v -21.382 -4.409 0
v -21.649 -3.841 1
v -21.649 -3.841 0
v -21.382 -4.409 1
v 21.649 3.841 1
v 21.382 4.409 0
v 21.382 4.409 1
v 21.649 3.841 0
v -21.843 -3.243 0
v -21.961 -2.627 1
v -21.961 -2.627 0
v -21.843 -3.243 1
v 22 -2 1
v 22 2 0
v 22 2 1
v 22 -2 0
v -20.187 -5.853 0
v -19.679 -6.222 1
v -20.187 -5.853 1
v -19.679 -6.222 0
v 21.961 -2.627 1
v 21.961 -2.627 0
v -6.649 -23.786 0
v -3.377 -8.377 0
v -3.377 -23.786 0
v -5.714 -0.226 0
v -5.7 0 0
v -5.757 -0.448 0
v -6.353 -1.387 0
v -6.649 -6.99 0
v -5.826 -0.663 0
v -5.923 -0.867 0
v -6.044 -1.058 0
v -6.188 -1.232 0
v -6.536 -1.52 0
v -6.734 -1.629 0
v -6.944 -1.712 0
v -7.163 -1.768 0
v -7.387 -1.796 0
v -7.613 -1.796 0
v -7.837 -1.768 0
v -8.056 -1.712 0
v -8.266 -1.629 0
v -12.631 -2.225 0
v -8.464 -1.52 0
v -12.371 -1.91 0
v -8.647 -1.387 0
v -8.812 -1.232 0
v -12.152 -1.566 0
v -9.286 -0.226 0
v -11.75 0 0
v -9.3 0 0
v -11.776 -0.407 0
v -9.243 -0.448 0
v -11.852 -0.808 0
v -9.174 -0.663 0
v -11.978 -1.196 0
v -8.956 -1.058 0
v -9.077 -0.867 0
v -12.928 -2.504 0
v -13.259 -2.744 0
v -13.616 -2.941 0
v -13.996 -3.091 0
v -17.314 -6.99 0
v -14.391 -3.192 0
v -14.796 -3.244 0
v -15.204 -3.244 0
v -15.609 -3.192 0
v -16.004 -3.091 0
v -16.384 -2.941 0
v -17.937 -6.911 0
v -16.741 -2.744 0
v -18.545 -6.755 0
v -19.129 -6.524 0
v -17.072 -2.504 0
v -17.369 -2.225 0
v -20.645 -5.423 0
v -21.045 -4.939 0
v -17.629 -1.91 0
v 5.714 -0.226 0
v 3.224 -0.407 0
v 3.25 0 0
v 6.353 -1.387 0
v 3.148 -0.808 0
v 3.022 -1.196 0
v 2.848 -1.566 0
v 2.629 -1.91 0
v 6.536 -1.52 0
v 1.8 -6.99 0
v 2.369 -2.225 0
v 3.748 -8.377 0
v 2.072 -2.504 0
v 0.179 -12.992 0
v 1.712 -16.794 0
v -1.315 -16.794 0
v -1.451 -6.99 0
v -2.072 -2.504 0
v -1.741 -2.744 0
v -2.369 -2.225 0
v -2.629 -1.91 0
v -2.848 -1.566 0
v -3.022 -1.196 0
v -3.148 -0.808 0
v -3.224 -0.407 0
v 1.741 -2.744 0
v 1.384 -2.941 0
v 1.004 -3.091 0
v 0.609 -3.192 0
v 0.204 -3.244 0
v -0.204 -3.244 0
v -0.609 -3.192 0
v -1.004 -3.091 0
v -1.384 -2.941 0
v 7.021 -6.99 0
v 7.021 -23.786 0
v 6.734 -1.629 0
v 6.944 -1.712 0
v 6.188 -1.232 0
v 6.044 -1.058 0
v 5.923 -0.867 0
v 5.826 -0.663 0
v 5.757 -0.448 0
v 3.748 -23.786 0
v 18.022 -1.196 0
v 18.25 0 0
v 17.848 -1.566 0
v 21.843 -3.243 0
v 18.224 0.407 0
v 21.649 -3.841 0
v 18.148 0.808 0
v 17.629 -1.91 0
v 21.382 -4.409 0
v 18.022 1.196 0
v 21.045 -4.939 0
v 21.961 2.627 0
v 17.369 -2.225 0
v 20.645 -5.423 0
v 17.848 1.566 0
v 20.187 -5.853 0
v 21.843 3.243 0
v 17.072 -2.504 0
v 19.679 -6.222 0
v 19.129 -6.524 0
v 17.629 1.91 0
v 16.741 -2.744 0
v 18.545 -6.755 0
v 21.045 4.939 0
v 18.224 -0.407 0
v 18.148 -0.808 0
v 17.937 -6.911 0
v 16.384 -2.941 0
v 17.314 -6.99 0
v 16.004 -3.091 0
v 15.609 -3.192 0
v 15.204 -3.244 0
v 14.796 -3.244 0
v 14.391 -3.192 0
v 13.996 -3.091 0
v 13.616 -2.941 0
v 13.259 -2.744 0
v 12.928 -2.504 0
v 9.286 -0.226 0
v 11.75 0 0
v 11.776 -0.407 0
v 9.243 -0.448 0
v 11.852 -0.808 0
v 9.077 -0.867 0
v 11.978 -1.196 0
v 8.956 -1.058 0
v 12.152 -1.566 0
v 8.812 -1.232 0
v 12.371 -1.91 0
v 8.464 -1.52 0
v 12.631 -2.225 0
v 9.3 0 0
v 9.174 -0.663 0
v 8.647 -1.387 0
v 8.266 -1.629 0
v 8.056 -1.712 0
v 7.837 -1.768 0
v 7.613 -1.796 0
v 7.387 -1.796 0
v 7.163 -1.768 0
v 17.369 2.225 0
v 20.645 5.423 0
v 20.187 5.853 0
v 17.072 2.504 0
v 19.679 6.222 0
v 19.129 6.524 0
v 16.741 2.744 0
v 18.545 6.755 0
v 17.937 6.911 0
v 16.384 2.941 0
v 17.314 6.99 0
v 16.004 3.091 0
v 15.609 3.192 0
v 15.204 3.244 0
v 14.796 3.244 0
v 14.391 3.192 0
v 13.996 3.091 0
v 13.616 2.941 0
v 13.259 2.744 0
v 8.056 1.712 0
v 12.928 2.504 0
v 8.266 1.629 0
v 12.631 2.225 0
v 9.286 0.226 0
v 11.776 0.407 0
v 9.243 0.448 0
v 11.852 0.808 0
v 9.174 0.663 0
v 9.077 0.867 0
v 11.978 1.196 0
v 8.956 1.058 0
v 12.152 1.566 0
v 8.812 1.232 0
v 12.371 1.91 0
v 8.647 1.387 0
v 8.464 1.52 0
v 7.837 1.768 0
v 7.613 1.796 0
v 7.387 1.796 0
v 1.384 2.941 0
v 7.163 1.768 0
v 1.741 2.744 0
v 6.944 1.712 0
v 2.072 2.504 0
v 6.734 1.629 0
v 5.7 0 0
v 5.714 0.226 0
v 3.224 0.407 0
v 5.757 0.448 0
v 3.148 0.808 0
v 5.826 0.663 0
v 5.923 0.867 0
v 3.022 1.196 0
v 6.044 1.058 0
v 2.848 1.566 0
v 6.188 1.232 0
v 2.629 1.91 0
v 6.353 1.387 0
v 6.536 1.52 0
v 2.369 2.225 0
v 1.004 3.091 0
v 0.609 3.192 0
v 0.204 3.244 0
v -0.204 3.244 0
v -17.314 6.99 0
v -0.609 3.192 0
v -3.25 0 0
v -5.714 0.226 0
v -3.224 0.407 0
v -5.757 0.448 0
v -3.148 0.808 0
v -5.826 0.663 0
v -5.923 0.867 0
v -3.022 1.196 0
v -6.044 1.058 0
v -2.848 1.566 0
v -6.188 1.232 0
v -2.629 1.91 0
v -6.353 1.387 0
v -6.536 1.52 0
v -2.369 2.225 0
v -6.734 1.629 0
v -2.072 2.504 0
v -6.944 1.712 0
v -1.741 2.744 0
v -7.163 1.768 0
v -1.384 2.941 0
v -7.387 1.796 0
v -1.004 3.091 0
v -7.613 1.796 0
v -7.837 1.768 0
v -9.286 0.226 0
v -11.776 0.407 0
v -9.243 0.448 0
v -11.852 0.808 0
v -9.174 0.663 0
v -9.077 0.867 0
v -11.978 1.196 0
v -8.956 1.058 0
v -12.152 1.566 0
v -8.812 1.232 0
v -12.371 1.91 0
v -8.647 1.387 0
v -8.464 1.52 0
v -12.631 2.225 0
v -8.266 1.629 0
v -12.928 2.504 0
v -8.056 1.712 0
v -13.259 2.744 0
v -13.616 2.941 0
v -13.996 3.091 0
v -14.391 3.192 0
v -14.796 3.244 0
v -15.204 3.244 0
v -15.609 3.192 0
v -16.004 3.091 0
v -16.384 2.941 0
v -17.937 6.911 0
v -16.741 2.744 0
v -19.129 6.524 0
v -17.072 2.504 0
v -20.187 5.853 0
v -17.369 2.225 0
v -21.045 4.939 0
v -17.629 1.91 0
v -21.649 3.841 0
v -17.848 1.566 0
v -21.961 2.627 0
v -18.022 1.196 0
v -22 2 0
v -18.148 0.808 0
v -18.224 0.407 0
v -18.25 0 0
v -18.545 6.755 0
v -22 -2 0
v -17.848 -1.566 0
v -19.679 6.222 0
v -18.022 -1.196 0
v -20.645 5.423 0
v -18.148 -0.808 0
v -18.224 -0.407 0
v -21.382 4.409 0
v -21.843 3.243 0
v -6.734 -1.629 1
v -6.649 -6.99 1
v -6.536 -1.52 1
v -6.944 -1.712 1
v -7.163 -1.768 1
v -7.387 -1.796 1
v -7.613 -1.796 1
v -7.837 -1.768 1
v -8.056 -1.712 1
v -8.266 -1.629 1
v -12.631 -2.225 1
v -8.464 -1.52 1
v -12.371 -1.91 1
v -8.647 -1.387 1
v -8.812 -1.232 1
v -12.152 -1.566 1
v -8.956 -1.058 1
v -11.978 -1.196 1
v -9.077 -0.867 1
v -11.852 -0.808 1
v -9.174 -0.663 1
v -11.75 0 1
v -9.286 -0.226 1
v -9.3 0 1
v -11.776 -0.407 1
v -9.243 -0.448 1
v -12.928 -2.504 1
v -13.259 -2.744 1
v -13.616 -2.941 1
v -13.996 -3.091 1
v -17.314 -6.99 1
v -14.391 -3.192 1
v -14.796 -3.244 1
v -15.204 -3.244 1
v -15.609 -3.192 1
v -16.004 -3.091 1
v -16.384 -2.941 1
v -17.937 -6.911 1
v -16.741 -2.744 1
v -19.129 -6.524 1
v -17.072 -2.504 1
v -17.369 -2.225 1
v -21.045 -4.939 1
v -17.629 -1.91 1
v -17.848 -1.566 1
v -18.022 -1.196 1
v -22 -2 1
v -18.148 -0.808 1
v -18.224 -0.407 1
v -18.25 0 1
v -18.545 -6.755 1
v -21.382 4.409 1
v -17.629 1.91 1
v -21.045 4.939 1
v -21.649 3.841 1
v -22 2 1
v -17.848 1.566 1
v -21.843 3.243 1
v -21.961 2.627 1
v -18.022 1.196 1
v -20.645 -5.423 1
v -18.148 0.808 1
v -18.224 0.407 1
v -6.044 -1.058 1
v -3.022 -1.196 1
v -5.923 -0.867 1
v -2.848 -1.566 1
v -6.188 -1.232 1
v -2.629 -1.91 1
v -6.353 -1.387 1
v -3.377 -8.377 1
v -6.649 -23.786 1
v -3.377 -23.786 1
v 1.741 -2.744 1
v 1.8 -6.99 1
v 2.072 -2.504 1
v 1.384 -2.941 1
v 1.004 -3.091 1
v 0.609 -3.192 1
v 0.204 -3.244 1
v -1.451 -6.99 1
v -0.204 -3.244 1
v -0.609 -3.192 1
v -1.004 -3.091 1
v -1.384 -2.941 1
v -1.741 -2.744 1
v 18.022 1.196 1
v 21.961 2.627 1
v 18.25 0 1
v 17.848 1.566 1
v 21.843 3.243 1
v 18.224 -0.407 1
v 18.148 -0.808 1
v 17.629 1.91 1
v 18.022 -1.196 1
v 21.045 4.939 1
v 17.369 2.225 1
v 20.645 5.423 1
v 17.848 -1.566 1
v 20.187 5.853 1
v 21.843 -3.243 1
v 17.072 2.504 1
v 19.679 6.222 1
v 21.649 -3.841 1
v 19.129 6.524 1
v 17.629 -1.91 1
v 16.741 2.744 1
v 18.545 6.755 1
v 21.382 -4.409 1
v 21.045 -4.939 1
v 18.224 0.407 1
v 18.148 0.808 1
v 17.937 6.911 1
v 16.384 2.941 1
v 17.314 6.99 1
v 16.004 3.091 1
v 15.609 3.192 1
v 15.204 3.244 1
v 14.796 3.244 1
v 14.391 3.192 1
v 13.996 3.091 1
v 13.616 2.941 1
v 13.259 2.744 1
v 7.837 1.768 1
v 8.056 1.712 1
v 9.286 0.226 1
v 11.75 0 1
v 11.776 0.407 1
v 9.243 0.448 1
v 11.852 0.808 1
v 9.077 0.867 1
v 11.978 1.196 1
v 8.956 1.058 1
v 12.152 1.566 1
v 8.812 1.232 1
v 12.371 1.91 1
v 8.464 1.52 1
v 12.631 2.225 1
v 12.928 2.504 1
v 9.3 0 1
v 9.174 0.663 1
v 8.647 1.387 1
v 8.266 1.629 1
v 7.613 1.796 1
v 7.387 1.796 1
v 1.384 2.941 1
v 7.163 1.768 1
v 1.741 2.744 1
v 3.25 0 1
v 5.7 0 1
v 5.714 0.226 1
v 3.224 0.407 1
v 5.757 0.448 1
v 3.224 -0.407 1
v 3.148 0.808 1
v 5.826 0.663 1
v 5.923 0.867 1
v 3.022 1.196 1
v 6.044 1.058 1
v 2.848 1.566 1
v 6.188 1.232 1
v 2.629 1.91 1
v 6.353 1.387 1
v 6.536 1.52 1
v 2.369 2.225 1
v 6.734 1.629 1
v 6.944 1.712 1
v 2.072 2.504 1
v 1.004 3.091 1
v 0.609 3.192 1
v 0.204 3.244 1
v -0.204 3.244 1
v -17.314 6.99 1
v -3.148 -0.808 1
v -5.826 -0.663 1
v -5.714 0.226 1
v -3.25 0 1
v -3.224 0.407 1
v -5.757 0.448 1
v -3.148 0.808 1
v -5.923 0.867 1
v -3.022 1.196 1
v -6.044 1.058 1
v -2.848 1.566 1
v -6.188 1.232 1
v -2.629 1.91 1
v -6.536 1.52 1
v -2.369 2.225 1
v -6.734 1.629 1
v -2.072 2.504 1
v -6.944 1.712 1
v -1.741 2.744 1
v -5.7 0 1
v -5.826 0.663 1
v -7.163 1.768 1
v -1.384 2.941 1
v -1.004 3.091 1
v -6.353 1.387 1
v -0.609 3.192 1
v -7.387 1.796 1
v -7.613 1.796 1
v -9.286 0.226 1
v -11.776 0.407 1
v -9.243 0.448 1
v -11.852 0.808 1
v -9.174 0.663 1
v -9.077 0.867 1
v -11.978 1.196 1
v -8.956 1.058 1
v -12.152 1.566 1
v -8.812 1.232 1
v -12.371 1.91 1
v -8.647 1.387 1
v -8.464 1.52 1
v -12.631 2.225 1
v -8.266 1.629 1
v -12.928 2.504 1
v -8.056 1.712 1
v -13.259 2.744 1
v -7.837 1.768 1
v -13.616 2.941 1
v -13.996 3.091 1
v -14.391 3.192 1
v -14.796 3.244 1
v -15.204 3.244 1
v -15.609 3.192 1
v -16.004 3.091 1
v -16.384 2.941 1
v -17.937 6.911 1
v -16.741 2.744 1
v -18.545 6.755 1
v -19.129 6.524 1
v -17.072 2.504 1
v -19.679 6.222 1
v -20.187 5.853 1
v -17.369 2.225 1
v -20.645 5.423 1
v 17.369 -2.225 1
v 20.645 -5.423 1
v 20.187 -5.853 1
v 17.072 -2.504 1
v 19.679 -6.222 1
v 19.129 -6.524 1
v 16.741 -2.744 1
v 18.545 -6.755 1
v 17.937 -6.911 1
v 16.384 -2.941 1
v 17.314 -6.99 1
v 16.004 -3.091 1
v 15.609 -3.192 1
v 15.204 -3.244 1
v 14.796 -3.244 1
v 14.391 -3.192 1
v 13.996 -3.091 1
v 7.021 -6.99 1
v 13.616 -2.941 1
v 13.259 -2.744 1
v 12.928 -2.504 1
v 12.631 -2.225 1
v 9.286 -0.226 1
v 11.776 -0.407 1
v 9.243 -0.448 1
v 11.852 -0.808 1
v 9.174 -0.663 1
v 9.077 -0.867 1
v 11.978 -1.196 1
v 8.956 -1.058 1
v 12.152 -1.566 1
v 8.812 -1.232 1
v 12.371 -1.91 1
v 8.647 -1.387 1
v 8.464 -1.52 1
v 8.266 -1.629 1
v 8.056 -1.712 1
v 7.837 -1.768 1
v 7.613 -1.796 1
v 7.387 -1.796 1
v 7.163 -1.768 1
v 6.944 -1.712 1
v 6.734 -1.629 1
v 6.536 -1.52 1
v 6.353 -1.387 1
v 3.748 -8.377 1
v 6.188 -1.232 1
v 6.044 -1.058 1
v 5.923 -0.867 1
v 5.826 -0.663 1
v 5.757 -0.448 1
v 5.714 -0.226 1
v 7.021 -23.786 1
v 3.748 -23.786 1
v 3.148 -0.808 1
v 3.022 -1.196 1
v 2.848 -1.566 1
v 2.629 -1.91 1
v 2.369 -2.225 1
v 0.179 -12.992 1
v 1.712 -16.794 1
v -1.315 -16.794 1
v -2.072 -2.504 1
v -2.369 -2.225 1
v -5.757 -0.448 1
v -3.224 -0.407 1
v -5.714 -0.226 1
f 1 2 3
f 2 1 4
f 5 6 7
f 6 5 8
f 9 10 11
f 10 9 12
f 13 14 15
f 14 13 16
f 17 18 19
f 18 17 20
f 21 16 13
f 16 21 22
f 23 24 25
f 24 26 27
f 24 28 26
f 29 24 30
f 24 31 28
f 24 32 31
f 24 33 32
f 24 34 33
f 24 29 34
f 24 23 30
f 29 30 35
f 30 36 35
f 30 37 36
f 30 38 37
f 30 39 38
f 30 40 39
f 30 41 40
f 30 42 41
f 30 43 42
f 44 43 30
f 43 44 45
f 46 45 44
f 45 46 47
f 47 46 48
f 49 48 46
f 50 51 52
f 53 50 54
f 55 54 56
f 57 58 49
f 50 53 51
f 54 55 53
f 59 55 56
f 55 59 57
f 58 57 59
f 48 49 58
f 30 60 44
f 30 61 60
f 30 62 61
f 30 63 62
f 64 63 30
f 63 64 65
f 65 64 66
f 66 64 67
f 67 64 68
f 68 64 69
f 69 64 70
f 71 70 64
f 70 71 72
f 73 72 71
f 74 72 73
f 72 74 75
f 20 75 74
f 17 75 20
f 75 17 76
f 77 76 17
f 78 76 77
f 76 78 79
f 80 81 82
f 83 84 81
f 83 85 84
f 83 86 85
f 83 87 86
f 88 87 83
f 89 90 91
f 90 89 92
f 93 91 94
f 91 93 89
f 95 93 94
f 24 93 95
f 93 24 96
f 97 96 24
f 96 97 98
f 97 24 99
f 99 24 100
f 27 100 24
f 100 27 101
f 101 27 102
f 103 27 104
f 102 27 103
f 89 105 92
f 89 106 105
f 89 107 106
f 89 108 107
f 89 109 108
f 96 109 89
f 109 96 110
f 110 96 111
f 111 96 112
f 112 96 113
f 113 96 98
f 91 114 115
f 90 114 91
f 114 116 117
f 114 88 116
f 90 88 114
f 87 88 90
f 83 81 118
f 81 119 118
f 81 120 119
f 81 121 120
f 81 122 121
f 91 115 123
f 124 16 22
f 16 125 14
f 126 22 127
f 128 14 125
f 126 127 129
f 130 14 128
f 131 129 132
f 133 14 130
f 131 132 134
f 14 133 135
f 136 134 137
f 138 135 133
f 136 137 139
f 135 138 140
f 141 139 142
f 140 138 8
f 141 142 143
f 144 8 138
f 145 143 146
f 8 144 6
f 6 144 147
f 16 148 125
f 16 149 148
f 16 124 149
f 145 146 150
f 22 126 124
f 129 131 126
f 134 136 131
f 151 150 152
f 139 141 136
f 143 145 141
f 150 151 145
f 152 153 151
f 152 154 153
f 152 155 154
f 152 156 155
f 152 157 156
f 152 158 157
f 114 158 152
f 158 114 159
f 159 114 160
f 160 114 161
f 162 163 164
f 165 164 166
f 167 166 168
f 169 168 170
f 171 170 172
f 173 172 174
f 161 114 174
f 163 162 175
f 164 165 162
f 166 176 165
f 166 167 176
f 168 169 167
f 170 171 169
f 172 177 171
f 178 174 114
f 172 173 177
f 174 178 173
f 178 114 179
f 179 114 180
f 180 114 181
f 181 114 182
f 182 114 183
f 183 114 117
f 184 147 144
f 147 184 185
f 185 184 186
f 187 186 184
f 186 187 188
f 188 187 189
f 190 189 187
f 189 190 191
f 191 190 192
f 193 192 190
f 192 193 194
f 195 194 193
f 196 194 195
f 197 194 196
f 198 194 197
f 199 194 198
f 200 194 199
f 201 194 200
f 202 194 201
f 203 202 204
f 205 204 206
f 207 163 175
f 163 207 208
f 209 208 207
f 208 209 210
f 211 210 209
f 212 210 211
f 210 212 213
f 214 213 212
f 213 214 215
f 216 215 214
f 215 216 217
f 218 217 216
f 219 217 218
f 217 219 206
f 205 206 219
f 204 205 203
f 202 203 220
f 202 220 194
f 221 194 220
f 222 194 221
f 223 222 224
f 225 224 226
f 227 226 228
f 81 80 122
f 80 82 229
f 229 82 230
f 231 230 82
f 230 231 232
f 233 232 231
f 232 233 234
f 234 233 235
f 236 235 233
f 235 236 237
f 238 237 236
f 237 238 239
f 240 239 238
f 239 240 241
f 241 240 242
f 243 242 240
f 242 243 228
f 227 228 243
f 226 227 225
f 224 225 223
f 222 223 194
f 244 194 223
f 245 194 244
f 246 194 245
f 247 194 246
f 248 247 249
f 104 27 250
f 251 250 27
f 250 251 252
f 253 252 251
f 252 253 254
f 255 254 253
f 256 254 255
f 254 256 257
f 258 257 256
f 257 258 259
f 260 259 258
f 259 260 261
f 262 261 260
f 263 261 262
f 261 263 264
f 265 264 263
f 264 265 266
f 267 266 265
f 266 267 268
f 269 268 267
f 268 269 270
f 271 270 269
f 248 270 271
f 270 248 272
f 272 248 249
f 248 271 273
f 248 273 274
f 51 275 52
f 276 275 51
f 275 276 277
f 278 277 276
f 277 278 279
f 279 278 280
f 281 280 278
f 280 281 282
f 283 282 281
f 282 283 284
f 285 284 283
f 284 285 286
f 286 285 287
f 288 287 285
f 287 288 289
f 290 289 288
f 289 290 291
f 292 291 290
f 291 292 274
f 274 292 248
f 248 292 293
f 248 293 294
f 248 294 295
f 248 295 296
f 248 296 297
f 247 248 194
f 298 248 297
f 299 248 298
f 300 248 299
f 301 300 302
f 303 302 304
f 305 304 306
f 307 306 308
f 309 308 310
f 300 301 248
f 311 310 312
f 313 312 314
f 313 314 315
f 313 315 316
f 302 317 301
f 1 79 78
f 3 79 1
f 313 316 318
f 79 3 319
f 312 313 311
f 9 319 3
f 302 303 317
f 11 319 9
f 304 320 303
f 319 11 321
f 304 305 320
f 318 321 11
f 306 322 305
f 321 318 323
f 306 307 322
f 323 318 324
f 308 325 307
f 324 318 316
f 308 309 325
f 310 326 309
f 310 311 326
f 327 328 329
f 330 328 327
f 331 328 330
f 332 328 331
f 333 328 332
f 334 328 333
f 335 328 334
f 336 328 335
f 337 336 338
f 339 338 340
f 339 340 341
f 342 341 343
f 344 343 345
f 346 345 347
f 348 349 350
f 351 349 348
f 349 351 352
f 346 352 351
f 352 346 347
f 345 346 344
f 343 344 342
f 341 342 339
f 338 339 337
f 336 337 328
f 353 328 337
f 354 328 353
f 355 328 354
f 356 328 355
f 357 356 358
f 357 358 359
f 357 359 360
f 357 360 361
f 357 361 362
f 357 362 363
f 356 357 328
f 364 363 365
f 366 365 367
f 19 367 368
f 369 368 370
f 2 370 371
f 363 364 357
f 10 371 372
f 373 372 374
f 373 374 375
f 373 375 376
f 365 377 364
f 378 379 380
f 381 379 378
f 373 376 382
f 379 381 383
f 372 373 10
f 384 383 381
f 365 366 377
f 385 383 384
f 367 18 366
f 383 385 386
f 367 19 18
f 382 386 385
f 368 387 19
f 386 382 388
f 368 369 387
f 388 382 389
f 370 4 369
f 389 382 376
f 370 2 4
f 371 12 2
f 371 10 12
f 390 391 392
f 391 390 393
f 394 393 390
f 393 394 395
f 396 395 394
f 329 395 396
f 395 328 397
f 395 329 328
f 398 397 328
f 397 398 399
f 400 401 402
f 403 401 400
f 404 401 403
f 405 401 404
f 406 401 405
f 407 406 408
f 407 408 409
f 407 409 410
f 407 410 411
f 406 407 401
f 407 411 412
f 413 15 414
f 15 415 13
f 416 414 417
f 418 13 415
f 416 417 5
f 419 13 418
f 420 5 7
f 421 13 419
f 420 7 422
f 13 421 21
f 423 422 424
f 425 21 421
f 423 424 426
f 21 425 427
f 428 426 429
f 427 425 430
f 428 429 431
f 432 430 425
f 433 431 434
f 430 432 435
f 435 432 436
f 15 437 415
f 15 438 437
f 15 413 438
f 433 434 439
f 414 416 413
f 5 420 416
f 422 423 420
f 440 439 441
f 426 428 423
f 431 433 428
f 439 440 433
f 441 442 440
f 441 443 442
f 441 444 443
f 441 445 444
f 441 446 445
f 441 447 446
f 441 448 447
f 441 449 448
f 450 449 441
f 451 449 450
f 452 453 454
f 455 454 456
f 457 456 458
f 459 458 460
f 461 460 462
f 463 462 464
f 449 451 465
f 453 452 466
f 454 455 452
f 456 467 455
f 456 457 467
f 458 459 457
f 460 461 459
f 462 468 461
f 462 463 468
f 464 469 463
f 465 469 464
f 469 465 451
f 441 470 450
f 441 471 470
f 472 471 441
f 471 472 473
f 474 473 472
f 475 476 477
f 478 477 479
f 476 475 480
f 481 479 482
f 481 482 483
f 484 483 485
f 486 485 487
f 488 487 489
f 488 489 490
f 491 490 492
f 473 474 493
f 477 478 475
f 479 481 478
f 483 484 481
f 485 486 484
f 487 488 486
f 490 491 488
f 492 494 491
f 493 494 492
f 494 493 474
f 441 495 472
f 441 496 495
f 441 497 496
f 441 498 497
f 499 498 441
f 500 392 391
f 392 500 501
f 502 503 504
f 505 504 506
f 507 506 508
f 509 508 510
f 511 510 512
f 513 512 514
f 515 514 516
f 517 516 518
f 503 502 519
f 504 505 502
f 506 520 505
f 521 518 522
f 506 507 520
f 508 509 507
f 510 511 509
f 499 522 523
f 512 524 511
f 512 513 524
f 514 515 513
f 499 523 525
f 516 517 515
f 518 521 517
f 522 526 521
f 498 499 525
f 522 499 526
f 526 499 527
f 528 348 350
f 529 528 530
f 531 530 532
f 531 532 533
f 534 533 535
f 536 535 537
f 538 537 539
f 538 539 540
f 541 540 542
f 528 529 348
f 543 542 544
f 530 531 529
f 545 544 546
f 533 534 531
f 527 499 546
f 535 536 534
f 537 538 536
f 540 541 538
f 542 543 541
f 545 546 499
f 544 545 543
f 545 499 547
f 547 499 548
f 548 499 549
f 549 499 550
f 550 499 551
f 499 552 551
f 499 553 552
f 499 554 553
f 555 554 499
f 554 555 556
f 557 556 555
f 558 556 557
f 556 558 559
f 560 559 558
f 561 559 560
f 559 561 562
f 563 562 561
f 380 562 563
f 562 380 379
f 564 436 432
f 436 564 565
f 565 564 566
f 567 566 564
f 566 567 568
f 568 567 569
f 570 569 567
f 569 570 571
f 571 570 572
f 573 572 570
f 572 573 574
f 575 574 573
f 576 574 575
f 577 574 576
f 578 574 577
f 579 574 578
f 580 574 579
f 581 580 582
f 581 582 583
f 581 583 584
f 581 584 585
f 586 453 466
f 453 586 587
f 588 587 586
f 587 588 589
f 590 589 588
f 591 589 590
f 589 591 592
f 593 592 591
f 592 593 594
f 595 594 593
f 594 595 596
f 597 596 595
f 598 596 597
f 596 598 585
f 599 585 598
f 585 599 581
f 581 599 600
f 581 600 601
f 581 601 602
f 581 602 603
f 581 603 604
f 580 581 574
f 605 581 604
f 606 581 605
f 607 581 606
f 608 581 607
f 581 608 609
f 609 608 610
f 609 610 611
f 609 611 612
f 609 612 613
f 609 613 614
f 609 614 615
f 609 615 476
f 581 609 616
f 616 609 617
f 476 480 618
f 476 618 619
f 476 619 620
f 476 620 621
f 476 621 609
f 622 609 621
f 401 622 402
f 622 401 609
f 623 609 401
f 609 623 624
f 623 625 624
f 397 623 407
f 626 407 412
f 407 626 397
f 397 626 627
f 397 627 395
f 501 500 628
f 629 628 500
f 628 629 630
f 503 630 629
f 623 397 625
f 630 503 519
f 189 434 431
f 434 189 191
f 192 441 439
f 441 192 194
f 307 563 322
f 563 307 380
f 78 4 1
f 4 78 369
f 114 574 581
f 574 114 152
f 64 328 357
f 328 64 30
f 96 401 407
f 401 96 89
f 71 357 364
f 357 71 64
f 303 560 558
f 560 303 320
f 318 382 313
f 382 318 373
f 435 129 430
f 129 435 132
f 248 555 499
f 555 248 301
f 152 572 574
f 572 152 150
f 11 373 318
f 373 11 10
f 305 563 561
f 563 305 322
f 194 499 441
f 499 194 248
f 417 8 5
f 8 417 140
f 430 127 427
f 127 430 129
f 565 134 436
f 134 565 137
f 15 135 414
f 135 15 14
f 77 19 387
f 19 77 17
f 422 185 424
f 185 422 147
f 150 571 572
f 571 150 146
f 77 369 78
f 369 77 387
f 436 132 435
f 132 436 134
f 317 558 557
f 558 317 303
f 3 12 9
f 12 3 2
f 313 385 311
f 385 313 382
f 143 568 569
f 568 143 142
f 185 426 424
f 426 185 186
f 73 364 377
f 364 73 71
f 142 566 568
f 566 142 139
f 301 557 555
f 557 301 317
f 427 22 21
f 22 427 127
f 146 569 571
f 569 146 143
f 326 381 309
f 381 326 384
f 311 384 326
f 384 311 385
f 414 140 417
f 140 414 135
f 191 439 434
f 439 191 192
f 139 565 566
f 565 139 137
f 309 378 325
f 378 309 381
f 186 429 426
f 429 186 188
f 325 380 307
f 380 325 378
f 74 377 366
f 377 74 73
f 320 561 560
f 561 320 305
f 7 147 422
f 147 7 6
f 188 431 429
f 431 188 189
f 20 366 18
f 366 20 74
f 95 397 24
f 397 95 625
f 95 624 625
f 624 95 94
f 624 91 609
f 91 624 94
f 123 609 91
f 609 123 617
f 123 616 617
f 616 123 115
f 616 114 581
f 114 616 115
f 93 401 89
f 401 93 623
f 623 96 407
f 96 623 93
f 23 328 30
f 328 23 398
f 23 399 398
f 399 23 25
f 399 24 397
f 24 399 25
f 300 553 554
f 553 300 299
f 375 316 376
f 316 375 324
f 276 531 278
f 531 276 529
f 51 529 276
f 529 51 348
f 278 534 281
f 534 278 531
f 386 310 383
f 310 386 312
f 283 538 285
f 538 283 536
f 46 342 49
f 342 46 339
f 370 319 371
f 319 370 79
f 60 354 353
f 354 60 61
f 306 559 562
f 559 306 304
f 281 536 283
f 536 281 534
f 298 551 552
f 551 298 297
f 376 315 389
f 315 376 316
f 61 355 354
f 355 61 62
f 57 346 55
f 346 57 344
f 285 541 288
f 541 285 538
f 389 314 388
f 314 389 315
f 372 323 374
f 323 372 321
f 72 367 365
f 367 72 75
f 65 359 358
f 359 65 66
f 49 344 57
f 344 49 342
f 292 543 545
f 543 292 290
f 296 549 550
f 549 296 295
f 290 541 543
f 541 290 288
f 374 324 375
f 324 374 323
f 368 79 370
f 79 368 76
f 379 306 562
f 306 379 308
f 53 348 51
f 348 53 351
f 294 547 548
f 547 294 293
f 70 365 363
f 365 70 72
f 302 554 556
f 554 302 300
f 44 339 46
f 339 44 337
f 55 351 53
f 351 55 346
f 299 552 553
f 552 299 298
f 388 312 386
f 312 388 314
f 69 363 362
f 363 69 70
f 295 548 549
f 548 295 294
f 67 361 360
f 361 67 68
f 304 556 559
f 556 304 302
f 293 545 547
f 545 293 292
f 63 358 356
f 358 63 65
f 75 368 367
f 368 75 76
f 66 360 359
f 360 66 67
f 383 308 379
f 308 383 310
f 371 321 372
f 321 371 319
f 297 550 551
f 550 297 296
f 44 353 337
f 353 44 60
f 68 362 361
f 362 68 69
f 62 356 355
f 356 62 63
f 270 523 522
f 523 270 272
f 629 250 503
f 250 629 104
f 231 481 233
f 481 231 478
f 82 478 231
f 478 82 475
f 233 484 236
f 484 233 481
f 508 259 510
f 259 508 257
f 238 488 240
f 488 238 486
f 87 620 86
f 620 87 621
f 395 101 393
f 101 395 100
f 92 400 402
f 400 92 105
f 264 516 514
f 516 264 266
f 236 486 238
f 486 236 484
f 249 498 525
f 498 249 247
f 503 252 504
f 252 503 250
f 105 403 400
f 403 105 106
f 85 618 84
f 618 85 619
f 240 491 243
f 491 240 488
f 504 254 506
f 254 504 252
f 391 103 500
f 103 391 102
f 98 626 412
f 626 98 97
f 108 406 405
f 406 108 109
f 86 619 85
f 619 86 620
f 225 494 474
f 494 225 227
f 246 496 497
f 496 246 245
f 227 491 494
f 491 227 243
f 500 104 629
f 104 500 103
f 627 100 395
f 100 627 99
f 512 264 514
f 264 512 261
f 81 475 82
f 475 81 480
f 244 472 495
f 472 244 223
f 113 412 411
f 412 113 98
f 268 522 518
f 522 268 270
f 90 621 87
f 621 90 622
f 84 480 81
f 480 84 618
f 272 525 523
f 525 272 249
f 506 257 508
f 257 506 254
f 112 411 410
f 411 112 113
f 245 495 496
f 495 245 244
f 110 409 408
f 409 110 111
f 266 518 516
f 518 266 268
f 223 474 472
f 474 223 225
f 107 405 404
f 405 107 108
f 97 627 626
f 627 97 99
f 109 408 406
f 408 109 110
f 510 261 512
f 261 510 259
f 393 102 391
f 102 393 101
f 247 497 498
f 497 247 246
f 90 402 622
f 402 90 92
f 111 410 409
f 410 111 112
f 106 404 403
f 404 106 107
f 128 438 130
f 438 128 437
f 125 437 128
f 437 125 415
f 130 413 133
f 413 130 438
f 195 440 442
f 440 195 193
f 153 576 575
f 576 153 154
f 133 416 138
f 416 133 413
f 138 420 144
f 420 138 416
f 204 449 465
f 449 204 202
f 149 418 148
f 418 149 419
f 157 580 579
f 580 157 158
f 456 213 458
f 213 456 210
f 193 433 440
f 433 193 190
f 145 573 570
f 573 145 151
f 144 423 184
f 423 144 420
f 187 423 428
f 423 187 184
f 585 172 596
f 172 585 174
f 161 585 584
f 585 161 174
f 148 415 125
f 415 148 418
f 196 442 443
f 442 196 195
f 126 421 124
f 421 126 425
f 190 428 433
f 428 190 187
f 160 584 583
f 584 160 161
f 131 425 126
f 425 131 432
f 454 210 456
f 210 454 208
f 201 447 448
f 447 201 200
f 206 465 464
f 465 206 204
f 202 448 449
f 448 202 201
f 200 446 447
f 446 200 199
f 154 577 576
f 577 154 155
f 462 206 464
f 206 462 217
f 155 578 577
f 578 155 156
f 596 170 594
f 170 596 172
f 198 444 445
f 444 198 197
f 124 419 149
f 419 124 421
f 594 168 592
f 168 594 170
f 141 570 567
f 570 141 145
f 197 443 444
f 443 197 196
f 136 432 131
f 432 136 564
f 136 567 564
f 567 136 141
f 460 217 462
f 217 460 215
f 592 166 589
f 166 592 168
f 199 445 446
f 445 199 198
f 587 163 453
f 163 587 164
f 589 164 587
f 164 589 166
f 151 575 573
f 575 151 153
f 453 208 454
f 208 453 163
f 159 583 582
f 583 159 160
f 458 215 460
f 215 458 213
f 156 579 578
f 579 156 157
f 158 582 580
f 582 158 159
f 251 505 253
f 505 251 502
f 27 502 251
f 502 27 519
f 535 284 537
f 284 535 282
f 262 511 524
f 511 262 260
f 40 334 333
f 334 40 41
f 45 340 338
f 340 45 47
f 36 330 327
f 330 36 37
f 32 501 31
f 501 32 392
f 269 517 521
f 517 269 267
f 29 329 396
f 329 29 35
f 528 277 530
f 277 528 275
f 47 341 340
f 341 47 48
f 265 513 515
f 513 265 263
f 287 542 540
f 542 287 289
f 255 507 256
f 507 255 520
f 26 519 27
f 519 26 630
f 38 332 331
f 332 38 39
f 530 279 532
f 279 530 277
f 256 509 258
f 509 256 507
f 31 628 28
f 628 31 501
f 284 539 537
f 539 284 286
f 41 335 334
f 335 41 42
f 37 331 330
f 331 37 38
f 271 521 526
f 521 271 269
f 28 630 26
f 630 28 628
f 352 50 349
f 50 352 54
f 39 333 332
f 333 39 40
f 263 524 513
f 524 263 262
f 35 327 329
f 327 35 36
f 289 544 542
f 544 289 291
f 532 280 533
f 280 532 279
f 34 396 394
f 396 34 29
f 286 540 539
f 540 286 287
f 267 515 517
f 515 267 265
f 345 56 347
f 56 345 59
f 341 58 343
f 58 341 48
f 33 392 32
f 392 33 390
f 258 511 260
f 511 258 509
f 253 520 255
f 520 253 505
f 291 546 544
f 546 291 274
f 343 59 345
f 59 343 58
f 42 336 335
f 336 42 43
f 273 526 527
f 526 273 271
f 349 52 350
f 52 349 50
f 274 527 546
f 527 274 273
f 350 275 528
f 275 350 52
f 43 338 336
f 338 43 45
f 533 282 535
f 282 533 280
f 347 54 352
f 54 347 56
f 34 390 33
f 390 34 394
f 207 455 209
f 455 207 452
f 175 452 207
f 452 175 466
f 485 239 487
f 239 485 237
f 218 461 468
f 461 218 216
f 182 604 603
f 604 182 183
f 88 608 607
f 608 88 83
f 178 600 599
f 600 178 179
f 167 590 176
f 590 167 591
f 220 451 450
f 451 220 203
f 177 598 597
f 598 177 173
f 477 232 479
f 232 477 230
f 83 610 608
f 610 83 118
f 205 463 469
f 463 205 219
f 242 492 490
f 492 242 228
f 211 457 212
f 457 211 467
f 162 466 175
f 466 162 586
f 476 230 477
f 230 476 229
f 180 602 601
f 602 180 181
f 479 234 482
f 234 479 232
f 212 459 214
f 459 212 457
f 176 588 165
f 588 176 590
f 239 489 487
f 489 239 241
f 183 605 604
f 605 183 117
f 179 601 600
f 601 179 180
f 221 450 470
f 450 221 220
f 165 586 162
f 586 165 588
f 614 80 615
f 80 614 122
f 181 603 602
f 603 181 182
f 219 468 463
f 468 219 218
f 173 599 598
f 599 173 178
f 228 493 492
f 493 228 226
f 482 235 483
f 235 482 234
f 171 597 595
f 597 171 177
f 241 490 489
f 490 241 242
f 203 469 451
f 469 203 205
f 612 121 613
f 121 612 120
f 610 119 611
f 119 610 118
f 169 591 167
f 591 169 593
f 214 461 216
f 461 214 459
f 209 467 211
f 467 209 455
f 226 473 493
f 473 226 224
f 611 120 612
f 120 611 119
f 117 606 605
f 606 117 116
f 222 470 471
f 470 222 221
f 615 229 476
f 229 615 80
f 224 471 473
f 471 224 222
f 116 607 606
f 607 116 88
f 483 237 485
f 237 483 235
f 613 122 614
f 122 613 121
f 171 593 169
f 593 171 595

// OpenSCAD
$fn = 50;


difference() {
	union() {
		*color(alpha = 1.0000000000, c = "gray") {
			translate(v = [0, 14, 0]) {
				linear_extrude(height = 1) {
					text(font = "Arial:style=Bold", halign = "center", size = 4.5000000000, text = "COMMENT description oobb_plate_shape_p_type_1_depth_3_width_1_thickness_m_extra_oobb_size", valign = "center");
				}
			}
		}
		hull() {
			translate(v = [-17.0000000000, 2.0000000000, 0]) {
				cylinder(h = 1, r = 5);
			}
			translate(v = [17.0000000000, 2.0000000000, 0]) {
				cylinder(h = 1, r = 5);
			}
			translate(v = [-17.0000000000, -2.0000000000, 0]) {
				cylinder(h = 1, r = 5);
			}
			translate(v = [17.0000000000, -2.0000000000, 0]) {
				cylinder(h = 1, r = 5);
			}
		}
		translate(v = [0, -5, 0]) {
			linear_extrude(height = 1) {
				text(font = "DejaVu Sans Mono:style=Bold", halign = "center", size = 19.0000000000, text = "M", valign = "top");
			}
		}
	}
	union() {
		*color(alpha = 1.0000000000, c = "gray") {
			translate(v = [0, 14, 0]) {
				linear_extrude(height = 1) {
					text(font = "Arial:style=Bold", halign = "center", size = 4.5000000000, text = "COMMENT description oobb_holes_shape_n_type_3_width_1_thickness_m_extra_oobb_size_1_height_'all'_holes_true_both_holes", valign = "center");
				}
			}
		}
		translate(v = [-15.0000000000, 0.0000000000, 0]) {
			translate(v = [0, 0, -50]) {
				cylinder(h = 100, r = 3.2500000000);
			}
		}
		translate(v = [0, 0, -50]) {
			cylinder(h = 100, r = 3.2500000000);
		}
		translate(v = [15.0000000000, 0.0000000000, 0]) {
			translate(v = [0, 0, -50]) {
				cylinder(h = 100, r = 3.2500000000);
			}
		}
		translate(v = [-15.0000000000, 0.0000000000, 0]) {
			translate(v = [0, 0, -50]) {
				cylinder(h = 100, r = 1.8000000000);
			}
		}
		translate(v = [-7.5000000000, 0.0000000000, 0]) {
			translate(v = [0, 0, -50]) {
				cylinder(h = 100, r = 1.8000000000);
			}
		}
		translate(v = [0, 0, -50]) {
			cylinder(h = 100, r = 1.8000000000);
		}
		translate(v = [7.5000000000, 0.0000000000, 0]) {
			translate(v = [0, 0, -50]) {
				cylinder(h = 100, r = 1.8000000000);
			}
		}
		translate(v = [15.0000000000, 0.0000000000, 0]) {
			translate(v = [0, 0, -50]) {
				cylinder(h = 100, r = 1.8000000000);
			}
		}
	}
}
